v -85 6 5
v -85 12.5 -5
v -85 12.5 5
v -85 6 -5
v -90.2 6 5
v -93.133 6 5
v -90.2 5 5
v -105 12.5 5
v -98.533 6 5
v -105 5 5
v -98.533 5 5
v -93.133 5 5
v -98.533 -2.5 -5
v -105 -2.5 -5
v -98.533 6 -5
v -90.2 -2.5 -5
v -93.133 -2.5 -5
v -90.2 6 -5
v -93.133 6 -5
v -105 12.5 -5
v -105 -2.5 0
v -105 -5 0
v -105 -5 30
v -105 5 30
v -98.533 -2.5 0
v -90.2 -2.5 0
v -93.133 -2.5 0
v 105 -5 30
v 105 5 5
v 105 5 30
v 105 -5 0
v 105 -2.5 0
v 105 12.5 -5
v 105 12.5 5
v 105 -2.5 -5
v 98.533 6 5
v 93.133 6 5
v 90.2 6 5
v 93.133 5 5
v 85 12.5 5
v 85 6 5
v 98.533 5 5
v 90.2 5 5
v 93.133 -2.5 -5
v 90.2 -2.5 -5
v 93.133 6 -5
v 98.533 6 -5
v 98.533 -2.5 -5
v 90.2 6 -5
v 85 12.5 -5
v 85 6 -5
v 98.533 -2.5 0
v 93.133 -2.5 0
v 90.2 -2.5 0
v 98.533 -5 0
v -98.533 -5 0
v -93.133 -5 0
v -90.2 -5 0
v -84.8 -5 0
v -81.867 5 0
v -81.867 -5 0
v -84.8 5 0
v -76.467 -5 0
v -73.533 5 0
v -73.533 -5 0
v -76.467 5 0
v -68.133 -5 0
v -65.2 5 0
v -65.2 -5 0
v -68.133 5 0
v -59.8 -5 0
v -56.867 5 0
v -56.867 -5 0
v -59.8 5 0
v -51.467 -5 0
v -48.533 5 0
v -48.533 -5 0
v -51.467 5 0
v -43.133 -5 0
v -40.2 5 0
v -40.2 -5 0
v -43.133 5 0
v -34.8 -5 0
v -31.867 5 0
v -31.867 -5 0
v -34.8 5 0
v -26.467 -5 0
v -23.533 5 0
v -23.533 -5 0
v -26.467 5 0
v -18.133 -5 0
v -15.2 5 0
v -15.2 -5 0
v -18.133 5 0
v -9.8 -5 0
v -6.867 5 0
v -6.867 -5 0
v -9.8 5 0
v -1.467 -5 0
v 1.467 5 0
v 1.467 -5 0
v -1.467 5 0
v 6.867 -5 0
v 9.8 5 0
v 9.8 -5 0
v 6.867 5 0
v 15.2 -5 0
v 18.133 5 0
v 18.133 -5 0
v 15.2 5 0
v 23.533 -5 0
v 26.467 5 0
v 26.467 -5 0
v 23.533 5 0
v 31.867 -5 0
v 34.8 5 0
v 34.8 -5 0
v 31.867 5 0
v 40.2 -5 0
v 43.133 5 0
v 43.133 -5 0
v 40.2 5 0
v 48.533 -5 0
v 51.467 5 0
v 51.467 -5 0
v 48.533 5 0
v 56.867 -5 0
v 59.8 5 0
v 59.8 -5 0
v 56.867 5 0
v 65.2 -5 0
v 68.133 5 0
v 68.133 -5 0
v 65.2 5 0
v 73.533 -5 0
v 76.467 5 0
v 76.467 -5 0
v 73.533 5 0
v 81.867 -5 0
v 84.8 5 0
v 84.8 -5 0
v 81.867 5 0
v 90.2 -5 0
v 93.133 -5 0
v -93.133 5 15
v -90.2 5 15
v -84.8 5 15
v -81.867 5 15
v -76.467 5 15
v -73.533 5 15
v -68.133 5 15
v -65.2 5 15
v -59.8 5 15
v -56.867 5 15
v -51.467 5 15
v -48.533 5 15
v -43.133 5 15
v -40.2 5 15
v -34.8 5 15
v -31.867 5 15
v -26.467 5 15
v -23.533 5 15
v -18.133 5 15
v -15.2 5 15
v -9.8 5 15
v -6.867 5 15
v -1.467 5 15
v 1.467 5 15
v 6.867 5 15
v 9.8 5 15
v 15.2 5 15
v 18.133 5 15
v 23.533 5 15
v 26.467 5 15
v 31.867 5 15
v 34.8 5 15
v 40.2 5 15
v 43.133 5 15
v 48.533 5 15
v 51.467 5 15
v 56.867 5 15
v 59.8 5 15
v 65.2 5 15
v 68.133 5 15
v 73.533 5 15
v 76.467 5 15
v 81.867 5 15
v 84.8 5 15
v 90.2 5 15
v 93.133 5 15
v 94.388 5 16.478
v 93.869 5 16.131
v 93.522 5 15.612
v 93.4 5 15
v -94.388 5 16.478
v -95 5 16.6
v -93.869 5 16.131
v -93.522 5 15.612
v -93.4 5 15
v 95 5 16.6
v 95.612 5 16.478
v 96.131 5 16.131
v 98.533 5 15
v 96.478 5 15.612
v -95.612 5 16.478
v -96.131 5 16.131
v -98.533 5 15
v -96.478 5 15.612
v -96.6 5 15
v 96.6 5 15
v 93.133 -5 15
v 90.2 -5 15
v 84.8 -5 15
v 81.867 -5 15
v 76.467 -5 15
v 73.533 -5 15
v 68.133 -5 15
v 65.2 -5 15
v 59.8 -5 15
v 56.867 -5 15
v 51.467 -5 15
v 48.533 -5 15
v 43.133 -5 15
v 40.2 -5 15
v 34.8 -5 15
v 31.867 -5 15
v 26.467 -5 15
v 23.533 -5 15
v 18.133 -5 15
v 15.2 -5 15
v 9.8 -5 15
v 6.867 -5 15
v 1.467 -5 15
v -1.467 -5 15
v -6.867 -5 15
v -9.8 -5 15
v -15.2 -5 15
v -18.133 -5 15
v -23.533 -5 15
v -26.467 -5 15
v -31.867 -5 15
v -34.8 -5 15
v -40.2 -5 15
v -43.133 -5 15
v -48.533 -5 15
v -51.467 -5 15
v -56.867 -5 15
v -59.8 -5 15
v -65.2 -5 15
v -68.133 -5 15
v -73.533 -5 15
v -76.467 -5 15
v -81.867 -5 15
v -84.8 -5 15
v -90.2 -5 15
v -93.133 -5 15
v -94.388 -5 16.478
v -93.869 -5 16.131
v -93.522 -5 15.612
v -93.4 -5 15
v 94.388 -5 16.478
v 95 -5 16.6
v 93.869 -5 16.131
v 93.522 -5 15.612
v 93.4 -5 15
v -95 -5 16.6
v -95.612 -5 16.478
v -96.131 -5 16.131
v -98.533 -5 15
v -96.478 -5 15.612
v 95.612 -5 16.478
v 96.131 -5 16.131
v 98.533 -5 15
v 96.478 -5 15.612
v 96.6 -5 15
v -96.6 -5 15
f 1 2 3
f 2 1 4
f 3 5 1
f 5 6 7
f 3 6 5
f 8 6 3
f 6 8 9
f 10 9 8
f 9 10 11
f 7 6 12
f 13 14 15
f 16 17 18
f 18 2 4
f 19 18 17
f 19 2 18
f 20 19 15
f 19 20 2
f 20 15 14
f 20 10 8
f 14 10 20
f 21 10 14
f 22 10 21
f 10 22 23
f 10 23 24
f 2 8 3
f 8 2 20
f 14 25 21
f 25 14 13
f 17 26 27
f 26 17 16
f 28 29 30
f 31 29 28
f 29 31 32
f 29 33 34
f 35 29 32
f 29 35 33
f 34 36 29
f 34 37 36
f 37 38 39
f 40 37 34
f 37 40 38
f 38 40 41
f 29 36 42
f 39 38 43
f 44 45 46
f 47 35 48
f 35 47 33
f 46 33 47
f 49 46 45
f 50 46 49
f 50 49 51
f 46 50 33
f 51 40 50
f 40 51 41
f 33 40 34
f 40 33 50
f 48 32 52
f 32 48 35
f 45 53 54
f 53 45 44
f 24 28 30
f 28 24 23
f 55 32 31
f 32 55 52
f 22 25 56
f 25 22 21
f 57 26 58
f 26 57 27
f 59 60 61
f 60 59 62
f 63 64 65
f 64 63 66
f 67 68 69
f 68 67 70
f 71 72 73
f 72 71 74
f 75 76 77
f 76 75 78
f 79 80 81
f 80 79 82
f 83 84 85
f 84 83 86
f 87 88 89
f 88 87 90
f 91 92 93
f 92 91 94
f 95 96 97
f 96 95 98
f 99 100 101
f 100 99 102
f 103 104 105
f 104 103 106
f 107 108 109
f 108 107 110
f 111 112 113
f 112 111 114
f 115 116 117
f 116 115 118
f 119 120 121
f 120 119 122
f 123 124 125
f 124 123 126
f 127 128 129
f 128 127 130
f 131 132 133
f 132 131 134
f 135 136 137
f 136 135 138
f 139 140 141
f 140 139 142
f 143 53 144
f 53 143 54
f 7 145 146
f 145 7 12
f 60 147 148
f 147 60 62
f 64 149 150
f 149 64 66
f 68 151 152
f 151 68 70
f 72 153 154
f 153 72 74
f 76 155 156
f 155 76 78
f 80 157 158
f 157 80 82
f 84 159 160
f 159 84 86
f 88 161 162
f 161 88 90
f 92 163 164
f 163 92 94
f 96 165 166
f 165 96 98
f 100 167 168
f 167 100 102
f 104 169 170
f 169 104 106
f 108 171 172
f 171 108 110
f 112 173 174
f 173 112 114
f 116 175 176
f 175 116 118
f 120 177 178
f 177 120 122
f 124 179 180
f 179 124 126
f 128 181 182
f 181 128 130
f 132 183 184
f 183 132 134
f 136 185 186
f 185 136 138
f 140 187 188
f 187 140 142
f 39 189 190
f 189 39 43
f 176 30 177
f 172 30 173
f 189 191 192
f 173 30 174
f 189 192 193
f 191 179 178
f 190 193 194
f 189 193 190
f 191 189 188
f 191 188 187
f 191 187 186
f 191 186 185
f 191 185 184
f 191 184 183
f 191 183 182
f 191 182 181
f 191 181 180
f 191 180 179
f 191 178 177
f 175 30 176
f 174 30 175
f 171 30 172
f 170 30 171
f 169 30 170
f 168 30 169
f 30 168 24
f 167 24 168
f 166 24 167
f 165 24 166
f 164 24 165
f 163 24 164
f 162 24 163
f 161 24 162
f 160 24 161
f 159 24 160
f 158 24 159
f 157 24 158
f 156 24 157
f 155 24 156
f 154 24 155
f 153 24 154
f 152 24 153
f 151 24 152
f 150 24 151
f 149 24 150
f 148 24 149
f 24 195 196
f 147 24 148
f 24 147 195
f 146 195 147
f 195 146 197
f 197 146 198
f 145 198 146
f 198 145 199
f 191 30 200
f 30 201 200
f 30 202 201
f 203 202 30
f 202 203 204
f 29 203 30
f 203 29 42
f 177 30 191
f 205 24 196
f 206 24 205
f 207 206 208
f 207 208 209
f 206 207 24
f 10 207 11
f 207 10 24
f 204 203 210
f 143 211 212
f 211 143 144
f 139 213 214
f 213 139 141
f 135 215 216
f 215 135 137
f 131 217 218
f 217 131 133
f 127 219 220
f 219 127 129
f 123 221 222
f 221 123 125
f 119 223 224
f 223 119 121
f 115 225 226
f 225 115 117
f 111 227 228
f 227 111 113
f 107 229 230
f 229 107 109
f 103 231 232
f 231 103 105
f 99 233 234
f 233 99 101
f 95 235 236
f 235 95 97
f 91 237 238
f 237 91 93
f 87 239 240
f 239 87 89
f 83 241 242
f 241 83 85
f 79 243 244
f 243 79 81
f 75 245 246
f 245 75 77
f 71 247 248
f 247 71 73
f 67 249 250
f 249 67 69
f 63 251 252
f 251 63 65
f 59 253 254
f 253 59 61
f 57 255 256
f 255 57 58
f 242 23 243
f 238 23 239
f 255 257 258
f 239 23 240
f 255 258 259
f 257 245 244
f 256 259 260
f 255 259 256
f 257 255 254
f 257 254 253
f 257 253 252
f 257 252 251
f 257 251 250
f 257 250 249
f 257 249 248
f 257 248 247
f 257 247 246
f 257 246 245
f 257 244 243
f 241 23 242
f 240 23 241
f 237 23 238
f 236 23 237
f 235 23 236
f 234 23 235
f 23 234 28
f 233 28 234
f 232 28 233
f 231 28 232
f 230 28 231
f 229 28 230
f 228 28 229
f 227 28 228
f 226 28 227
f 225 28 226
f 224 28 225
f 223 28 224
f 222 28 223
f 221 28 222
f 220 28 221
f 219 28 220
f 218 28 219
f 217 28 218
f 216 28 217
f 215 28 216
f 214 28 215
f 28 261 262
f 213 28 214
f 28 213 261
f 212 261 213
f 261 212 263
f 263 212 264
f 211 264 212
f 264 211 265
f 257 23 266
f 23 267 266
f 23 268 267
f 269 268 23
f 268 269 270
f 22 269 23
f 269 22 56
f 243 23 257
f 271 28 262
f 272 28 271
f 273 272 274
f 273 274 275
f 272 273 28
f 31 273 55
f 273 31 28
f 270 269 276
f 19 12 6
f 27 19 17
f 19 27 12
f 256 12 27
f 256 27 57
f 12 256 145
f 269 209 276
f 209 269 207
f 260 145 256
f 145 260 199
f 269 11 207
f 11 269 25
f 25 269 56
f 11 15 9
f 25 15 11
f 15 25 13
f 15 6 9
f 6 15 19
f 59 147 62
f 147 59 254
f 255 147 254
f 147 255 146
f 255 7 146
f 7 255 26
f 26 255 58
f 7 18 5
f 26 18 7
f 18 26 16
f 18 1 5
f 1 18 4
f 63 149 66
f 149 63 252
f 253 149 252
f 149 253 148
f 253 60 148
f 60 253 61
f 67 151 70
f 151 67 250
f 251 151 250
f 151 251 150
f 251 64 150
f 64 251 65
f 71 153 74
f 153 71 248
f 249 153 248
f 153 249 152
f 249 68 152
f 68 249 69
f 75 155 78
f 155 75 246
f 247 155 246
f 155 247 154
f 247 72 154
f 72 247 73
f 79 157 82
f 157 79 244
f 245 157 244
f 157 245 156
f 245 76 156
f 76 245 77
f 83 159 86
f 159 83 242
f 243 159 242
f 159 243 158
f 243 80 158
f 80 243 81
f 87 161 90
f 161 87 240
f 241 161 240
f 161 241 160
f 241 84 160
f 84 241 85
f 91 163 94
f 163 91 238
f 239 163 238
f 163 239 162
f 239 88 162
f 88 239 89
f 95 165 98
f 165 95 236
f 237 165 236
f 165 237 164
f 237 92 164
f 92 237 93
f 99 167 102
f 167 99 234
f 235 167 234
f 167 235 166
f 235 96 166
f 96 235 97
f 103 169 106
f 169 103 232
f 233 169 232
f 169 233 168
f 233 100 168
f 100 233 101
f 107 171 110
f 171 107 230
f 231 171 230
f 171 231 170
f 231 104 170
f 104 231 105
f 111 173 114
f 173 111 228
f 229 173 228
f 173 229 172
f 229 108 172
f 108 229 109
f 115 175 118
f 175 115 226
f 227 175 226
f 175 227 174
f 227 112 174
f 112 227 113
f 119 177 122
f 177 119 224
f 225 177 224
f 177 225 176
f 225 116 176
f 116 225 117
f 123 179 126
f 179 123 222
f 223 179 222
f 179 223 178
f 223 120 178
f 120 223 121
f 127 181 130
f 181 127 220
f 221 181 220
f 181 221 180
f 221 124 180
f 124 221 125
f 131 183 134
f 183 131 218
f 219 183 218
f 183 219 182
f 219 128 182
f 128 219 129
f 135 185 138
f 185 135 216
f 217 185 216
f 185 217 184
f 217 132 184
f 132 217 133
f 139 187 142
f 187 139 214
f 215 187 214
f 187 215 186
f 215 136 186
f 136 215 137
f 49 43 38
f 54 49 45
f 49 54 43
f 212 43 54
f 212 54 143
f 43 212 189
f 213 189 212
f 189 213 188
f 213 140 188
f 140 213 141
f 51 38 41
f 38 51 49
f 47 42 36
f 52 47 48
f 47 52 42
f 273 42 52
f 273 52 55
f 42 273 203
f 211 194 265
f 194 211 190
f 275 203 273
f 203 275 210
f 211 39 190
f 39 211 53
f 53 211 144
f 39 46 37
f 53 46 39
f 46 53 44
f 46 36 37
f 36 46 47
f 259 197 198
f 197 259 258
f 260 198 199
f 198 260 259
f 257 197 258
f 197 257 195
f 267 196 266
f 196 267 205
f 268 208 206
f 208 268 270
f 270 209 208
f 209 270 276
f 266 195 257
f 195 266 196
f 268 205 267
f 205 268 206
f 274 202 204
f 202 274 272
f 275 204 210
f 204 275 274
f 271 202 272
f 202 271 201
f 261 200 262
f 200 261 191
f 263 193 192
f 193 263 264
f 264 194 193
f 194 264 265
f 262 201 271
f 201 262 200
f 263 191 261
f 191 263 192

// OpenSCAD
// file: ../common.scad
/*
 * WAVE OCEAN V10 - COMMON PARAMETERS
 *
 * Shared constants, tolerances, and hardware specifications
 * All dimensions in mm
 *
 * MECHANISM: Helical groove cam drives 24 slats via follower arms
 * - Worm rotates around X axis
 * - Groove follows helix at radius GROOVE_RADIUS
 * - Follower rollers ride in groove, push slats up/down
 * - Phase difference along X creates traveling wave illusion
 */

// ============================================
// PRINT TOLERANCES (tune for your printer)
// ============================================

TOL_CLEARANCE = 0.2;         // Shaft in hole clearance
TOL_PRESS_FIT = -0.15;       // Bearing press-fit interference
TOL_SLIDING = 0.4;           // Sliding fit (guide slots)
TOL_SCREW_HOLE = 0.2;        // Screw hole clearance

// ============================================
// HARDWARE - BEARINGS
// ============================================

// 608 bearing (worm shaft)
BEARING_608_ID = 8;
BEARING_608_OD = 22;
BEARING_608_H = 7;

// 624 bearing (follower rollers)
BEARING_624_ID = 4;
BEARING_624_OD = 13;
BEARING_624_H = 5;

// ============================================
// HARDWARE - FASTENERS
// ============================================

M3_HOLE_DIA = 3 + TOL_SCREW_HOLE;      // 3.2mm
M3_HEAD_DIA = 5.5;
M3_HEAD_H = 3;
M3_NUT_FLAT = 5.5;
M3_NUT_H = 2.4;
M3_INSERT_DIA = 4.0;                    // Heat-set insert hole
M3_INSERT_DEPTH = 5;

// ============================================
// HARDWARE - SHAFTS AND PINS
// ============================================

WORM_SHAFT_DIA = 8;
WORM_SHAFT_LENGTH = 280;               // Extends beyond worm for bearings

ROLLER_AXLE_DIA = 4;
ROLLER_AXLE_LENGTH = 12;

PIVOT_PIN_DIA = 3;
PIVOT_PIN_LENGTH = 15;

// ============================================
// WORM CAM DIMENSIONS
// ============================================

WORM_LENGTH = 200;
WORM_OUTER_RADIUS = 20;              // 40mm diameter (bigger for deeper groove)
WORM_CORE_RADIUS = 10;               // 20mm diameter core
WORM_SHAFT_HOLE = WORM_SHAFT_DIA + TOL_CLEARANCE;  // 8.2mm

// Groove sized to contain 624 bearing roller
GROOVE_WIDTH = BEARING_624_H + 2;    // 7mm wide (bearing + clearance)
GROOVE_DEPTH = BEARING_624_OD/2 + 3; // 9.5mm deep (half bearing + margin)
GROOVE_RADIUS = WORM_OUTER_RADIUS - GROOVE_DEPTH/2;  // ~15mm from center

HELIX_PITCH = 25;                    // 25mm per rotation = 8 turns over 200mm

// ============================================
// SLAT DIMENSIONS
// ============================================

NUM_SLATS = 24;
SLAT_SPACING = WORM_LENGTH / NUM_SLATS;  // 8.33mm

SLAT_WIDTH = 5;                       // X dimension (slightly wider)
SLAT_DEPTH = 30;                      // Y dimension (narrower)
SLAT_HEIGHT = 40;                     // Z dimension

// Wave motion amplitude (half of total travel)
WAVE_AMPLITUDE = 10;                  // ±10mm vertical motion

// ============================================
// FOLLOWER ARM DIMENSIONS
// ============================================

ARM_LENGTH = 35;                      // Pivot to roller center (LONGER)
ARM_WIDTH = 8;
ARM_THICKNESS = 6;

PIVOT_HOLE = PIVOT_PIN_DIA + TOL_CLEARANCE;    // 3.2mm
ROLLER_AXLE_HOLE = ROLLER_AXLE_DIA + TOL_CLEARANCE;  // 4.2mm

// ============================================
// SLAT BRACKET DIMENSIONS
// ============================================

BRACKET_WIDTH = 12;
BRACKET_DEPTH = 20;
BRACKET_HEIGHT = 25;

// ============================================
// GUIDE RAIL DIMENSIONS
// ============================================

GUIDE_LENGTH = 210;
GUIDE_HEIGHT = 30;                    // Taller for more travel
GUIDE_DEPTH = 10;
GUIDE_WALL = 3;

SLOT_WIDTH = SLAT_WIDTH + TOL_SLIDING;   // Slat slides in slot, not bracket tab
SLOT_HEIGHT = WAVE_AMPLITUDE * 2 + 10;   // Allow full travel + margin

// ============================================
// BEARING BLOCK DIMENSIONS
// ============================================

BEARING_BLOCK_WIDTH = 35;
BEARING_BLOCK_DEPTH = 35;
BEARING_BLOCK_HEIGHT = 30;

BEARING_POCKET_DIA = BEARING_608_OD + TOL_PRESS_FIT;  // 21.85mm
BEARING_POCKET_DEPTH = BEARING_608_H + 1;             // 8mm

// ============================================
// BASE PLATE DIMENSIONS
// ============================================

BASE_LENGTH = 280;                    // Longer to fit everything
BASE_WIDTH = 100;                     // Wider for stability
BASE_THICKNESS = 5;

// ============================================
// MOTOR MOUNT DIMENSIONS
// ============================================

N20_BODY_DIA = 12;
N20_BODY_LENGTH = 15;
N20_GEARBOX_DIA = 10;
N20_GEARBOX_LENGTH = 12;
N20_SHAFT_DIA = 3;
N20_SHAFT_LENGTH = 10;

// ============================================
// ASSEMBLY POSITIONS
// ============================================

// Worm center position
// Shaft runs along X axis at this Z height
WORM_CENTER_Z = BASE_THICKNESS + BEARING_BLOCK_HEIGHT;  // 35mm

// Guide rail positions (front and back of slats)
// Slats are centered at Y=0, spanning ±SLAT_DEPTH/2
GUIDE_FRONT_Y = -SLAT_DEPTH/2 - GUIDE_DEPTH/2;   // -20
GUIDE_BACK_Y = SLAT_DEPTH/2 + GUIDE_DEPTH/2;     // +20

// Guide rail Z - slats hang down from here
// Positioned so slat bottom can reach groove at top of worm
GUIDE_Z = WORM_CENTER_Z + WORM_OUTER_RADIUS + SLAT_HEIGHT/2 + 5;  // 80mm

// Bearing block X positions (at ends of worm, inward facing)
BEARING_L_X = -WORM_LENGTH/2 - BEARING_BLOCK_WIDTH/2;   // -117.5
BEARING_R_X = WORM_LENGTH/2 + BEARING_BLOCK_WIDTH/2;    // +117.5

// Motor mount X position (beyond right bearing block)
MOTOR_MOUNT_X = BEARING_R_X + BEARING_BLOCK_WIDTH/2 + 30;

// ============================================
// COLORS (for assembly visualization)
// ============================================

C_WORM = [0.75, 0.55, 0.2];
C_SLAT = [0.2, 0.45, 0.75];
C_BRACKET = [0.4, 0.4, 0.45];
C_ARM = [0.5, 0.5, 0.55];
C_GUIDE = [0.35, 0.35, 0.4];
C_BEARING_BLOCK = [0.3, 0.35, 0.4];
C_BASE = [0.25, 0.25, 0.3];
C_SHAFT = [0.6, 0.6, 0.65];
C_BEARING = [0.7, 0.7, 0.75];
C_MOTOR = [0.3, 0.3, 0.35];

// ============================================
// HELPER FUNCTIONS
// ============================================

// Helix angle at position X along worm (in degrees)
function helix_angle(x) = (x / HELIX_PITCH) * 360;

// Combined phase: helix position + shaft rotation
function phase(x, theta) = helix_angle(x) + theta;

// Groove center position in Y-Z plane (polar coordinates from shaft)
// Y = radius * sin(angle), Z = center + radius * cos(angle)
function groove_y(x, theta) = GROOVE_RADIUS * sin(phase(x, theta));
function groove_z(x, theta) = WORM_CENTER_Z + GROOVE_RADIUS * cos(phase(x, theta));

// Slat X position (evenly spaced along worm length)
function slat_x(i) = i * SLAT_SPACING - WORM_LENGTH/2 + SLAT_SPACING/2;

// Slat Z position - follows groove Z position via follower arm
// When groove is at top (cos=1), slat is pushed up
// When groove is at bottom (cos=-1), slat drops down
function slat_z(i, theta) =
    let(x = slat_x(i))
    GUIDE_Z + GROOVE_RADIUS * cos(phase(x, theta)) - GROOVE_RADIUS;

// ============================================
// CLEARANCE VERIFICATION
// ============================================

// Slat gap: SLAT_SPACING - SLAT_WIDTH = 8.33 - 5 = 3.33mm ✓
// Arm reach: ARM_LENGTH = 35mm, needs to reach ~30mm ✓
// Groove depth: 9.5mm, bearing radius 6.5mm ✓
// Wave travel: ±GROOVE_RADIUS * cos variation = ±15mm

// ============================================
// QUALITY SETTINGS
// ============================================

$fn = 48;  // Default facets
// main file
/*
 * GUIDE RAIL FRONT - Front Guide Rail with Slots
 *
 * Printable part: 1x
 * Print orientation: Flat on back
 *
 * Features:
 * - 24 vertical slots for slats to slide in
 * - Slats slide UP/DOWN through slots
 * - Mounting holes for base plate attachment
 */

include <../common.scad>

$fn = 32;

// ============================================
// MAIN GUIDE RAIL MODULE
// ============================================

module guide_rail_front() {
    difference() {
        union() {
            // Main rail body
            rail_body();

            // Mounting tabs at ends
            mounting_tabs();
        }

        // Slots for slats to slide through
        slat_slots();

        // Mounting holes
        mounting_holes();
    }
}

// ============================================
// RAIL BODY
// ============================================

module rail_body() {
    // Main rail - long in X, thin in Y, tall in Z
    // Rail sits at Y = GUIDE_FRONT_Y, slats pass through in Z direction
    translate([-GUIDE_LENGTH/2, -GUIDE_DEPTH/2, 0])
        cube([GUIDE_LENGTH, GUIDE_DEPTH, GUIDE_HEIGHT]);
}

// ============================================
// MOUNTING TABS
// ============================================

module mounting_tabs() {
    // Tabs at each end that attach to vertical supports
    tab_width = 20;
    tab_depth = 15;
    tab_height = 10;

    for (x_sign = [-1, 1]) {
        translate([x_sign * (GUIDE_LENGTH/2 - tab_width/2), GUIDE_DEPTH/2, 0])
            cube([tab_width, tab_depth, tab_height], center=true);
    }
}

// ============================================
// SLAT SLOTS
// ============================================

module slat_slots() {
    // 24 vertical slots for slats to slide through
    // Slots are in Z direction, slats move up/down

    for (i = [0 : NUM_SLATS - 1]) {
        x = slat_x(i);

        // Slot through rail (Z direction)
        translate([x, 0, -1])
            cube([SLOT_WIDTH, GUIDE_DEPTH + 2, GUIDE_HEIGHT + 2], center=true);
    }
}

// ============================================
// MOUNTING HOLES
// ============================================

module mounting_holes() {
    // M3 holes at ends for attachment to vertical supports
    for (x_sign = [-1, 1]) {
        translate([x_sign * (GUIDE_LENGTH/2 - 10), 0, GUIDE_HEIGHT/2])
        rotate([90, 0, 0])
            cylinder(d=M3_HOLE_DIA, h=GUIDE_DEPTH + 20, center=true, $fn=16);
    }
}

// ============================================
// RENDER
// ============================================

color(C_GUIDE)
guide_rail_front();

// ============================================
// INFO
// ============================================

echo("=== GUIDE RAIL FRONT ===");
echo(str("Length: ", GUIDE_LENGTH, "mm"));
echo(str("Height: ", GUIDE_HEIGHT, "mm"));
echo(str("Depth: ", GUIDE_DEPTH, "mm"));
echo(str("Slots: ", NUM_SLATS, " x ", SLOT_WIDTH, "mm wide"));
echo("");
echo("Print quantity: 1");
echo("Print orientation: Flat (lying on side)");
